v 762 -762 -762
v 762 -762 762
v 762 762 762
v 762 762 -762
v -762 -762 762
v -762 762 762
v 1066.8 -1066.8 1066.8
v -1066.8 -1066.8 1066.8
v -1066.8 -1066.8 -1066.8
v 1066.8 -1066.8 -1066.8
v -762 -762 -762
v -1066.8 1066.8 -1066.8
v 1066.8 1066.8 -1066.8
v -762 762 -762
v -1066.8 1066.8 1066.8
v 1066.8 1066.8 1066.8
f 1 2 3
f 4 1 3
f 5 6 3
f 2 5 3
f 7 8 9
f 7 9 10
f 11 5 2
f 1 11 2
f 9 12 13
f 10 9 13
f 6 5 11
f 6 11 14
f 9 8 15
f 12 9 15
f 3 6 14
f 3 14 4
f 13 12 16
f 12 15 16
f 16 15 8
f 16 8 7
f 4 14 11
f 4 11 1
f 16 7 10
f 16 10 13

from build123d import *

# Parameters (mm, degrees)
SKETCH1_W           = 2133.6
SKETCH1_H           = 2133.6
BOSS_EXTRUDE1_DEPTH = 1066.8
SHELL1_T            = 304.8


with BuildPart() as part:
    # Sketch1 → Boss-Extrude1 (new, symmetric)
    with BuildSketch(Plane.XY):
        Rectangle(SKETCH1_W, SKETCH1_H)
    extrude(amount=BOSS_EXTRUDE1_DEPTH, both=True)

    # Shell1 (no face opened: a closed hollow body)
    add(offset(amount=-SHELL1_T, mode=Mode.PRIVATE), mode=Mode.SUBTRACT)


solid = part.part
